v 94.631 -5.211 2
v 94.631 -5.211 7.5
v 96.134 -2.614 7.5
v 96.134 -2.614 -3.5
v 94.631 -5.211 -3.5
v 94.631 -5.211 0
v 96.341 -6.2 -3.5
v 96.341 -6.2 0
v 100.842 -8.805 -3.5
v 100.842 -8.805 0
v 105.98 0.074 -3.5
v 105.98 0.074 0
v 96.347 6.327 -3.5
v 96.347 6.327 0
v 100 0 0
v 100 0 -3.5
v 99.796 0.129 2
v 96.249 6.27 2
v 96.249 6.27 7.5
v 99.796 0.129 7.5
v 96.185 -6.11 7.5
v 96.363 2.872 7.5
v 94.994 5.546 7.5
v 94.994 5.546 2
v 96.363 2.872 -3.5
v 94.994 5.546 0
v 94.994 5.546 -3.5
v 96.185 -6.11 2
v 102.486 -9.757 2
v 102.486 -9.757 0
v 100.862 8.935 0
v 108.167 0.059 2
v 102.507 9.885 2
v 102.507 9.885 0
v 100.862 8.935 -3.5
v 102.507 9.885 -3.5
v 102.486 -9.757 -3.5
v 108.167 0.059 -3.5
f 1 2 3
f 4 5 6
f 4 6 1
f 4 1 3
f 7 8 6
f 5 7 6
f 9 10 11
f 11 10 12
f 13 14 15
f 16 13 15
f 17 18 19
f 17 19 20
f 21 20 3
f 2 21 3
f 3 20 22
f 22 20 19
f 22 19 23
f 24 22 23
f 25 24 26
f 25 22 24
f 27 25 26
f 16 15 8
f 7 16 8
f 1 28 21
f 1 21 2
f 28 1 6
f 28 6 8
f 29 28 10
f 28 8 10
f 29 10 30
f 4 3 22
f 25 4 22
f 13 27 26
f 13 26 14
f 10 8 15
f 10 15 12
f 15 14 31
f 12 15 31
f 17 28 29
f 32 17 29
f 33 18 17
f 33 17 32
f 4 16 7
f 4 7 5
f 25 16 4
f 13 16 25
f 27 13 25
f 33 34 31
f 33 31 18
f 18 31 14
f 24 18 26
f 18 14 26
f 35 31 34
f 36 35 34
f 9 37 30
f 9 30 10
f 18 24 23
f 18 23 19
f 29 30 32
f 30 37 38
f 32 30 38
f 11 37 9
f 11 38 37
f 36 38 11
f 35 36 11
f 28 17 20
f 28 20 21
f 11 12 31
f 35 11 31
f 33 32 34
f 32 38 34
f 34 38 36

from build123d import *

# Parameters (mm, degrees)
SALIENTE_EXTRUIR1_DEPTH = 2
SALIENTE_EXTRUIR2_DEPTH = 3.5
SALIENTE_EXTRUIR3_DEPTH = 5.5


with BuildPart() as part:
    # Croquis1 → Saliente-Extruir1 (new body)
    with BuildSketch(Plane.XY):
        Polygon((94.631182175, -5.210576854), (102.486249967, -9.756789114), (108.167092376, 0.058723162), (102.507485031, 9.885444115), (94.993770531, 5.545656204), (96.36344276, 2.872304936), (96.133929876, -2.614088967), align=None)
    extrude(amount=SALIENTE_EXTRUIR1_DEPTH)

    # Croquis2 → Saliente-Extruir2 (add)
    with BuildSketch(Plane(origin=(0, 0, 0), x_dir=(-1, 0, 0), z_dir=(0, 0, -1))):
        Polygon((-100.000000028, -1.2e-08), (-96.341228634, -6.200286222), (-94.631182175, -5.210576854), (-96.133929876, -2.614088967), (-96.36344276, 2.872304936), (-94.993770531, 5.545656204), (-96.346967159, 6.327238518), align=None)
        Polygon((-102.486249967, -9.756789114), (-100.841807638, -8.805048903), (-105.980454031, 0.073642516), (-100.862200724, 8.935157151), (-102.507485031, 9.885444115), (-108.167092376, 0.058723162), align=None)
    extrude(amount=SALIENTE_EXTRUIR2_DEPTH)

    # Croquis3 → Saliente-Extruir3 (add)
    with BuildSketch(Plane.XY.offset(2)):
        Polygon((94.631182175, -5.210576854), (96.133929876, -2.614088967), (96.36344276, 2.872304936), (94.993770531, 5.545656204), (96.248686318, 6.270473252), (99.795829711, 0.129107984), (96.184962548, -6.109845399), align=None)
    extrude(amount=SALIENTE_EXTRUIR3_DEPTH)


solid = part.part
